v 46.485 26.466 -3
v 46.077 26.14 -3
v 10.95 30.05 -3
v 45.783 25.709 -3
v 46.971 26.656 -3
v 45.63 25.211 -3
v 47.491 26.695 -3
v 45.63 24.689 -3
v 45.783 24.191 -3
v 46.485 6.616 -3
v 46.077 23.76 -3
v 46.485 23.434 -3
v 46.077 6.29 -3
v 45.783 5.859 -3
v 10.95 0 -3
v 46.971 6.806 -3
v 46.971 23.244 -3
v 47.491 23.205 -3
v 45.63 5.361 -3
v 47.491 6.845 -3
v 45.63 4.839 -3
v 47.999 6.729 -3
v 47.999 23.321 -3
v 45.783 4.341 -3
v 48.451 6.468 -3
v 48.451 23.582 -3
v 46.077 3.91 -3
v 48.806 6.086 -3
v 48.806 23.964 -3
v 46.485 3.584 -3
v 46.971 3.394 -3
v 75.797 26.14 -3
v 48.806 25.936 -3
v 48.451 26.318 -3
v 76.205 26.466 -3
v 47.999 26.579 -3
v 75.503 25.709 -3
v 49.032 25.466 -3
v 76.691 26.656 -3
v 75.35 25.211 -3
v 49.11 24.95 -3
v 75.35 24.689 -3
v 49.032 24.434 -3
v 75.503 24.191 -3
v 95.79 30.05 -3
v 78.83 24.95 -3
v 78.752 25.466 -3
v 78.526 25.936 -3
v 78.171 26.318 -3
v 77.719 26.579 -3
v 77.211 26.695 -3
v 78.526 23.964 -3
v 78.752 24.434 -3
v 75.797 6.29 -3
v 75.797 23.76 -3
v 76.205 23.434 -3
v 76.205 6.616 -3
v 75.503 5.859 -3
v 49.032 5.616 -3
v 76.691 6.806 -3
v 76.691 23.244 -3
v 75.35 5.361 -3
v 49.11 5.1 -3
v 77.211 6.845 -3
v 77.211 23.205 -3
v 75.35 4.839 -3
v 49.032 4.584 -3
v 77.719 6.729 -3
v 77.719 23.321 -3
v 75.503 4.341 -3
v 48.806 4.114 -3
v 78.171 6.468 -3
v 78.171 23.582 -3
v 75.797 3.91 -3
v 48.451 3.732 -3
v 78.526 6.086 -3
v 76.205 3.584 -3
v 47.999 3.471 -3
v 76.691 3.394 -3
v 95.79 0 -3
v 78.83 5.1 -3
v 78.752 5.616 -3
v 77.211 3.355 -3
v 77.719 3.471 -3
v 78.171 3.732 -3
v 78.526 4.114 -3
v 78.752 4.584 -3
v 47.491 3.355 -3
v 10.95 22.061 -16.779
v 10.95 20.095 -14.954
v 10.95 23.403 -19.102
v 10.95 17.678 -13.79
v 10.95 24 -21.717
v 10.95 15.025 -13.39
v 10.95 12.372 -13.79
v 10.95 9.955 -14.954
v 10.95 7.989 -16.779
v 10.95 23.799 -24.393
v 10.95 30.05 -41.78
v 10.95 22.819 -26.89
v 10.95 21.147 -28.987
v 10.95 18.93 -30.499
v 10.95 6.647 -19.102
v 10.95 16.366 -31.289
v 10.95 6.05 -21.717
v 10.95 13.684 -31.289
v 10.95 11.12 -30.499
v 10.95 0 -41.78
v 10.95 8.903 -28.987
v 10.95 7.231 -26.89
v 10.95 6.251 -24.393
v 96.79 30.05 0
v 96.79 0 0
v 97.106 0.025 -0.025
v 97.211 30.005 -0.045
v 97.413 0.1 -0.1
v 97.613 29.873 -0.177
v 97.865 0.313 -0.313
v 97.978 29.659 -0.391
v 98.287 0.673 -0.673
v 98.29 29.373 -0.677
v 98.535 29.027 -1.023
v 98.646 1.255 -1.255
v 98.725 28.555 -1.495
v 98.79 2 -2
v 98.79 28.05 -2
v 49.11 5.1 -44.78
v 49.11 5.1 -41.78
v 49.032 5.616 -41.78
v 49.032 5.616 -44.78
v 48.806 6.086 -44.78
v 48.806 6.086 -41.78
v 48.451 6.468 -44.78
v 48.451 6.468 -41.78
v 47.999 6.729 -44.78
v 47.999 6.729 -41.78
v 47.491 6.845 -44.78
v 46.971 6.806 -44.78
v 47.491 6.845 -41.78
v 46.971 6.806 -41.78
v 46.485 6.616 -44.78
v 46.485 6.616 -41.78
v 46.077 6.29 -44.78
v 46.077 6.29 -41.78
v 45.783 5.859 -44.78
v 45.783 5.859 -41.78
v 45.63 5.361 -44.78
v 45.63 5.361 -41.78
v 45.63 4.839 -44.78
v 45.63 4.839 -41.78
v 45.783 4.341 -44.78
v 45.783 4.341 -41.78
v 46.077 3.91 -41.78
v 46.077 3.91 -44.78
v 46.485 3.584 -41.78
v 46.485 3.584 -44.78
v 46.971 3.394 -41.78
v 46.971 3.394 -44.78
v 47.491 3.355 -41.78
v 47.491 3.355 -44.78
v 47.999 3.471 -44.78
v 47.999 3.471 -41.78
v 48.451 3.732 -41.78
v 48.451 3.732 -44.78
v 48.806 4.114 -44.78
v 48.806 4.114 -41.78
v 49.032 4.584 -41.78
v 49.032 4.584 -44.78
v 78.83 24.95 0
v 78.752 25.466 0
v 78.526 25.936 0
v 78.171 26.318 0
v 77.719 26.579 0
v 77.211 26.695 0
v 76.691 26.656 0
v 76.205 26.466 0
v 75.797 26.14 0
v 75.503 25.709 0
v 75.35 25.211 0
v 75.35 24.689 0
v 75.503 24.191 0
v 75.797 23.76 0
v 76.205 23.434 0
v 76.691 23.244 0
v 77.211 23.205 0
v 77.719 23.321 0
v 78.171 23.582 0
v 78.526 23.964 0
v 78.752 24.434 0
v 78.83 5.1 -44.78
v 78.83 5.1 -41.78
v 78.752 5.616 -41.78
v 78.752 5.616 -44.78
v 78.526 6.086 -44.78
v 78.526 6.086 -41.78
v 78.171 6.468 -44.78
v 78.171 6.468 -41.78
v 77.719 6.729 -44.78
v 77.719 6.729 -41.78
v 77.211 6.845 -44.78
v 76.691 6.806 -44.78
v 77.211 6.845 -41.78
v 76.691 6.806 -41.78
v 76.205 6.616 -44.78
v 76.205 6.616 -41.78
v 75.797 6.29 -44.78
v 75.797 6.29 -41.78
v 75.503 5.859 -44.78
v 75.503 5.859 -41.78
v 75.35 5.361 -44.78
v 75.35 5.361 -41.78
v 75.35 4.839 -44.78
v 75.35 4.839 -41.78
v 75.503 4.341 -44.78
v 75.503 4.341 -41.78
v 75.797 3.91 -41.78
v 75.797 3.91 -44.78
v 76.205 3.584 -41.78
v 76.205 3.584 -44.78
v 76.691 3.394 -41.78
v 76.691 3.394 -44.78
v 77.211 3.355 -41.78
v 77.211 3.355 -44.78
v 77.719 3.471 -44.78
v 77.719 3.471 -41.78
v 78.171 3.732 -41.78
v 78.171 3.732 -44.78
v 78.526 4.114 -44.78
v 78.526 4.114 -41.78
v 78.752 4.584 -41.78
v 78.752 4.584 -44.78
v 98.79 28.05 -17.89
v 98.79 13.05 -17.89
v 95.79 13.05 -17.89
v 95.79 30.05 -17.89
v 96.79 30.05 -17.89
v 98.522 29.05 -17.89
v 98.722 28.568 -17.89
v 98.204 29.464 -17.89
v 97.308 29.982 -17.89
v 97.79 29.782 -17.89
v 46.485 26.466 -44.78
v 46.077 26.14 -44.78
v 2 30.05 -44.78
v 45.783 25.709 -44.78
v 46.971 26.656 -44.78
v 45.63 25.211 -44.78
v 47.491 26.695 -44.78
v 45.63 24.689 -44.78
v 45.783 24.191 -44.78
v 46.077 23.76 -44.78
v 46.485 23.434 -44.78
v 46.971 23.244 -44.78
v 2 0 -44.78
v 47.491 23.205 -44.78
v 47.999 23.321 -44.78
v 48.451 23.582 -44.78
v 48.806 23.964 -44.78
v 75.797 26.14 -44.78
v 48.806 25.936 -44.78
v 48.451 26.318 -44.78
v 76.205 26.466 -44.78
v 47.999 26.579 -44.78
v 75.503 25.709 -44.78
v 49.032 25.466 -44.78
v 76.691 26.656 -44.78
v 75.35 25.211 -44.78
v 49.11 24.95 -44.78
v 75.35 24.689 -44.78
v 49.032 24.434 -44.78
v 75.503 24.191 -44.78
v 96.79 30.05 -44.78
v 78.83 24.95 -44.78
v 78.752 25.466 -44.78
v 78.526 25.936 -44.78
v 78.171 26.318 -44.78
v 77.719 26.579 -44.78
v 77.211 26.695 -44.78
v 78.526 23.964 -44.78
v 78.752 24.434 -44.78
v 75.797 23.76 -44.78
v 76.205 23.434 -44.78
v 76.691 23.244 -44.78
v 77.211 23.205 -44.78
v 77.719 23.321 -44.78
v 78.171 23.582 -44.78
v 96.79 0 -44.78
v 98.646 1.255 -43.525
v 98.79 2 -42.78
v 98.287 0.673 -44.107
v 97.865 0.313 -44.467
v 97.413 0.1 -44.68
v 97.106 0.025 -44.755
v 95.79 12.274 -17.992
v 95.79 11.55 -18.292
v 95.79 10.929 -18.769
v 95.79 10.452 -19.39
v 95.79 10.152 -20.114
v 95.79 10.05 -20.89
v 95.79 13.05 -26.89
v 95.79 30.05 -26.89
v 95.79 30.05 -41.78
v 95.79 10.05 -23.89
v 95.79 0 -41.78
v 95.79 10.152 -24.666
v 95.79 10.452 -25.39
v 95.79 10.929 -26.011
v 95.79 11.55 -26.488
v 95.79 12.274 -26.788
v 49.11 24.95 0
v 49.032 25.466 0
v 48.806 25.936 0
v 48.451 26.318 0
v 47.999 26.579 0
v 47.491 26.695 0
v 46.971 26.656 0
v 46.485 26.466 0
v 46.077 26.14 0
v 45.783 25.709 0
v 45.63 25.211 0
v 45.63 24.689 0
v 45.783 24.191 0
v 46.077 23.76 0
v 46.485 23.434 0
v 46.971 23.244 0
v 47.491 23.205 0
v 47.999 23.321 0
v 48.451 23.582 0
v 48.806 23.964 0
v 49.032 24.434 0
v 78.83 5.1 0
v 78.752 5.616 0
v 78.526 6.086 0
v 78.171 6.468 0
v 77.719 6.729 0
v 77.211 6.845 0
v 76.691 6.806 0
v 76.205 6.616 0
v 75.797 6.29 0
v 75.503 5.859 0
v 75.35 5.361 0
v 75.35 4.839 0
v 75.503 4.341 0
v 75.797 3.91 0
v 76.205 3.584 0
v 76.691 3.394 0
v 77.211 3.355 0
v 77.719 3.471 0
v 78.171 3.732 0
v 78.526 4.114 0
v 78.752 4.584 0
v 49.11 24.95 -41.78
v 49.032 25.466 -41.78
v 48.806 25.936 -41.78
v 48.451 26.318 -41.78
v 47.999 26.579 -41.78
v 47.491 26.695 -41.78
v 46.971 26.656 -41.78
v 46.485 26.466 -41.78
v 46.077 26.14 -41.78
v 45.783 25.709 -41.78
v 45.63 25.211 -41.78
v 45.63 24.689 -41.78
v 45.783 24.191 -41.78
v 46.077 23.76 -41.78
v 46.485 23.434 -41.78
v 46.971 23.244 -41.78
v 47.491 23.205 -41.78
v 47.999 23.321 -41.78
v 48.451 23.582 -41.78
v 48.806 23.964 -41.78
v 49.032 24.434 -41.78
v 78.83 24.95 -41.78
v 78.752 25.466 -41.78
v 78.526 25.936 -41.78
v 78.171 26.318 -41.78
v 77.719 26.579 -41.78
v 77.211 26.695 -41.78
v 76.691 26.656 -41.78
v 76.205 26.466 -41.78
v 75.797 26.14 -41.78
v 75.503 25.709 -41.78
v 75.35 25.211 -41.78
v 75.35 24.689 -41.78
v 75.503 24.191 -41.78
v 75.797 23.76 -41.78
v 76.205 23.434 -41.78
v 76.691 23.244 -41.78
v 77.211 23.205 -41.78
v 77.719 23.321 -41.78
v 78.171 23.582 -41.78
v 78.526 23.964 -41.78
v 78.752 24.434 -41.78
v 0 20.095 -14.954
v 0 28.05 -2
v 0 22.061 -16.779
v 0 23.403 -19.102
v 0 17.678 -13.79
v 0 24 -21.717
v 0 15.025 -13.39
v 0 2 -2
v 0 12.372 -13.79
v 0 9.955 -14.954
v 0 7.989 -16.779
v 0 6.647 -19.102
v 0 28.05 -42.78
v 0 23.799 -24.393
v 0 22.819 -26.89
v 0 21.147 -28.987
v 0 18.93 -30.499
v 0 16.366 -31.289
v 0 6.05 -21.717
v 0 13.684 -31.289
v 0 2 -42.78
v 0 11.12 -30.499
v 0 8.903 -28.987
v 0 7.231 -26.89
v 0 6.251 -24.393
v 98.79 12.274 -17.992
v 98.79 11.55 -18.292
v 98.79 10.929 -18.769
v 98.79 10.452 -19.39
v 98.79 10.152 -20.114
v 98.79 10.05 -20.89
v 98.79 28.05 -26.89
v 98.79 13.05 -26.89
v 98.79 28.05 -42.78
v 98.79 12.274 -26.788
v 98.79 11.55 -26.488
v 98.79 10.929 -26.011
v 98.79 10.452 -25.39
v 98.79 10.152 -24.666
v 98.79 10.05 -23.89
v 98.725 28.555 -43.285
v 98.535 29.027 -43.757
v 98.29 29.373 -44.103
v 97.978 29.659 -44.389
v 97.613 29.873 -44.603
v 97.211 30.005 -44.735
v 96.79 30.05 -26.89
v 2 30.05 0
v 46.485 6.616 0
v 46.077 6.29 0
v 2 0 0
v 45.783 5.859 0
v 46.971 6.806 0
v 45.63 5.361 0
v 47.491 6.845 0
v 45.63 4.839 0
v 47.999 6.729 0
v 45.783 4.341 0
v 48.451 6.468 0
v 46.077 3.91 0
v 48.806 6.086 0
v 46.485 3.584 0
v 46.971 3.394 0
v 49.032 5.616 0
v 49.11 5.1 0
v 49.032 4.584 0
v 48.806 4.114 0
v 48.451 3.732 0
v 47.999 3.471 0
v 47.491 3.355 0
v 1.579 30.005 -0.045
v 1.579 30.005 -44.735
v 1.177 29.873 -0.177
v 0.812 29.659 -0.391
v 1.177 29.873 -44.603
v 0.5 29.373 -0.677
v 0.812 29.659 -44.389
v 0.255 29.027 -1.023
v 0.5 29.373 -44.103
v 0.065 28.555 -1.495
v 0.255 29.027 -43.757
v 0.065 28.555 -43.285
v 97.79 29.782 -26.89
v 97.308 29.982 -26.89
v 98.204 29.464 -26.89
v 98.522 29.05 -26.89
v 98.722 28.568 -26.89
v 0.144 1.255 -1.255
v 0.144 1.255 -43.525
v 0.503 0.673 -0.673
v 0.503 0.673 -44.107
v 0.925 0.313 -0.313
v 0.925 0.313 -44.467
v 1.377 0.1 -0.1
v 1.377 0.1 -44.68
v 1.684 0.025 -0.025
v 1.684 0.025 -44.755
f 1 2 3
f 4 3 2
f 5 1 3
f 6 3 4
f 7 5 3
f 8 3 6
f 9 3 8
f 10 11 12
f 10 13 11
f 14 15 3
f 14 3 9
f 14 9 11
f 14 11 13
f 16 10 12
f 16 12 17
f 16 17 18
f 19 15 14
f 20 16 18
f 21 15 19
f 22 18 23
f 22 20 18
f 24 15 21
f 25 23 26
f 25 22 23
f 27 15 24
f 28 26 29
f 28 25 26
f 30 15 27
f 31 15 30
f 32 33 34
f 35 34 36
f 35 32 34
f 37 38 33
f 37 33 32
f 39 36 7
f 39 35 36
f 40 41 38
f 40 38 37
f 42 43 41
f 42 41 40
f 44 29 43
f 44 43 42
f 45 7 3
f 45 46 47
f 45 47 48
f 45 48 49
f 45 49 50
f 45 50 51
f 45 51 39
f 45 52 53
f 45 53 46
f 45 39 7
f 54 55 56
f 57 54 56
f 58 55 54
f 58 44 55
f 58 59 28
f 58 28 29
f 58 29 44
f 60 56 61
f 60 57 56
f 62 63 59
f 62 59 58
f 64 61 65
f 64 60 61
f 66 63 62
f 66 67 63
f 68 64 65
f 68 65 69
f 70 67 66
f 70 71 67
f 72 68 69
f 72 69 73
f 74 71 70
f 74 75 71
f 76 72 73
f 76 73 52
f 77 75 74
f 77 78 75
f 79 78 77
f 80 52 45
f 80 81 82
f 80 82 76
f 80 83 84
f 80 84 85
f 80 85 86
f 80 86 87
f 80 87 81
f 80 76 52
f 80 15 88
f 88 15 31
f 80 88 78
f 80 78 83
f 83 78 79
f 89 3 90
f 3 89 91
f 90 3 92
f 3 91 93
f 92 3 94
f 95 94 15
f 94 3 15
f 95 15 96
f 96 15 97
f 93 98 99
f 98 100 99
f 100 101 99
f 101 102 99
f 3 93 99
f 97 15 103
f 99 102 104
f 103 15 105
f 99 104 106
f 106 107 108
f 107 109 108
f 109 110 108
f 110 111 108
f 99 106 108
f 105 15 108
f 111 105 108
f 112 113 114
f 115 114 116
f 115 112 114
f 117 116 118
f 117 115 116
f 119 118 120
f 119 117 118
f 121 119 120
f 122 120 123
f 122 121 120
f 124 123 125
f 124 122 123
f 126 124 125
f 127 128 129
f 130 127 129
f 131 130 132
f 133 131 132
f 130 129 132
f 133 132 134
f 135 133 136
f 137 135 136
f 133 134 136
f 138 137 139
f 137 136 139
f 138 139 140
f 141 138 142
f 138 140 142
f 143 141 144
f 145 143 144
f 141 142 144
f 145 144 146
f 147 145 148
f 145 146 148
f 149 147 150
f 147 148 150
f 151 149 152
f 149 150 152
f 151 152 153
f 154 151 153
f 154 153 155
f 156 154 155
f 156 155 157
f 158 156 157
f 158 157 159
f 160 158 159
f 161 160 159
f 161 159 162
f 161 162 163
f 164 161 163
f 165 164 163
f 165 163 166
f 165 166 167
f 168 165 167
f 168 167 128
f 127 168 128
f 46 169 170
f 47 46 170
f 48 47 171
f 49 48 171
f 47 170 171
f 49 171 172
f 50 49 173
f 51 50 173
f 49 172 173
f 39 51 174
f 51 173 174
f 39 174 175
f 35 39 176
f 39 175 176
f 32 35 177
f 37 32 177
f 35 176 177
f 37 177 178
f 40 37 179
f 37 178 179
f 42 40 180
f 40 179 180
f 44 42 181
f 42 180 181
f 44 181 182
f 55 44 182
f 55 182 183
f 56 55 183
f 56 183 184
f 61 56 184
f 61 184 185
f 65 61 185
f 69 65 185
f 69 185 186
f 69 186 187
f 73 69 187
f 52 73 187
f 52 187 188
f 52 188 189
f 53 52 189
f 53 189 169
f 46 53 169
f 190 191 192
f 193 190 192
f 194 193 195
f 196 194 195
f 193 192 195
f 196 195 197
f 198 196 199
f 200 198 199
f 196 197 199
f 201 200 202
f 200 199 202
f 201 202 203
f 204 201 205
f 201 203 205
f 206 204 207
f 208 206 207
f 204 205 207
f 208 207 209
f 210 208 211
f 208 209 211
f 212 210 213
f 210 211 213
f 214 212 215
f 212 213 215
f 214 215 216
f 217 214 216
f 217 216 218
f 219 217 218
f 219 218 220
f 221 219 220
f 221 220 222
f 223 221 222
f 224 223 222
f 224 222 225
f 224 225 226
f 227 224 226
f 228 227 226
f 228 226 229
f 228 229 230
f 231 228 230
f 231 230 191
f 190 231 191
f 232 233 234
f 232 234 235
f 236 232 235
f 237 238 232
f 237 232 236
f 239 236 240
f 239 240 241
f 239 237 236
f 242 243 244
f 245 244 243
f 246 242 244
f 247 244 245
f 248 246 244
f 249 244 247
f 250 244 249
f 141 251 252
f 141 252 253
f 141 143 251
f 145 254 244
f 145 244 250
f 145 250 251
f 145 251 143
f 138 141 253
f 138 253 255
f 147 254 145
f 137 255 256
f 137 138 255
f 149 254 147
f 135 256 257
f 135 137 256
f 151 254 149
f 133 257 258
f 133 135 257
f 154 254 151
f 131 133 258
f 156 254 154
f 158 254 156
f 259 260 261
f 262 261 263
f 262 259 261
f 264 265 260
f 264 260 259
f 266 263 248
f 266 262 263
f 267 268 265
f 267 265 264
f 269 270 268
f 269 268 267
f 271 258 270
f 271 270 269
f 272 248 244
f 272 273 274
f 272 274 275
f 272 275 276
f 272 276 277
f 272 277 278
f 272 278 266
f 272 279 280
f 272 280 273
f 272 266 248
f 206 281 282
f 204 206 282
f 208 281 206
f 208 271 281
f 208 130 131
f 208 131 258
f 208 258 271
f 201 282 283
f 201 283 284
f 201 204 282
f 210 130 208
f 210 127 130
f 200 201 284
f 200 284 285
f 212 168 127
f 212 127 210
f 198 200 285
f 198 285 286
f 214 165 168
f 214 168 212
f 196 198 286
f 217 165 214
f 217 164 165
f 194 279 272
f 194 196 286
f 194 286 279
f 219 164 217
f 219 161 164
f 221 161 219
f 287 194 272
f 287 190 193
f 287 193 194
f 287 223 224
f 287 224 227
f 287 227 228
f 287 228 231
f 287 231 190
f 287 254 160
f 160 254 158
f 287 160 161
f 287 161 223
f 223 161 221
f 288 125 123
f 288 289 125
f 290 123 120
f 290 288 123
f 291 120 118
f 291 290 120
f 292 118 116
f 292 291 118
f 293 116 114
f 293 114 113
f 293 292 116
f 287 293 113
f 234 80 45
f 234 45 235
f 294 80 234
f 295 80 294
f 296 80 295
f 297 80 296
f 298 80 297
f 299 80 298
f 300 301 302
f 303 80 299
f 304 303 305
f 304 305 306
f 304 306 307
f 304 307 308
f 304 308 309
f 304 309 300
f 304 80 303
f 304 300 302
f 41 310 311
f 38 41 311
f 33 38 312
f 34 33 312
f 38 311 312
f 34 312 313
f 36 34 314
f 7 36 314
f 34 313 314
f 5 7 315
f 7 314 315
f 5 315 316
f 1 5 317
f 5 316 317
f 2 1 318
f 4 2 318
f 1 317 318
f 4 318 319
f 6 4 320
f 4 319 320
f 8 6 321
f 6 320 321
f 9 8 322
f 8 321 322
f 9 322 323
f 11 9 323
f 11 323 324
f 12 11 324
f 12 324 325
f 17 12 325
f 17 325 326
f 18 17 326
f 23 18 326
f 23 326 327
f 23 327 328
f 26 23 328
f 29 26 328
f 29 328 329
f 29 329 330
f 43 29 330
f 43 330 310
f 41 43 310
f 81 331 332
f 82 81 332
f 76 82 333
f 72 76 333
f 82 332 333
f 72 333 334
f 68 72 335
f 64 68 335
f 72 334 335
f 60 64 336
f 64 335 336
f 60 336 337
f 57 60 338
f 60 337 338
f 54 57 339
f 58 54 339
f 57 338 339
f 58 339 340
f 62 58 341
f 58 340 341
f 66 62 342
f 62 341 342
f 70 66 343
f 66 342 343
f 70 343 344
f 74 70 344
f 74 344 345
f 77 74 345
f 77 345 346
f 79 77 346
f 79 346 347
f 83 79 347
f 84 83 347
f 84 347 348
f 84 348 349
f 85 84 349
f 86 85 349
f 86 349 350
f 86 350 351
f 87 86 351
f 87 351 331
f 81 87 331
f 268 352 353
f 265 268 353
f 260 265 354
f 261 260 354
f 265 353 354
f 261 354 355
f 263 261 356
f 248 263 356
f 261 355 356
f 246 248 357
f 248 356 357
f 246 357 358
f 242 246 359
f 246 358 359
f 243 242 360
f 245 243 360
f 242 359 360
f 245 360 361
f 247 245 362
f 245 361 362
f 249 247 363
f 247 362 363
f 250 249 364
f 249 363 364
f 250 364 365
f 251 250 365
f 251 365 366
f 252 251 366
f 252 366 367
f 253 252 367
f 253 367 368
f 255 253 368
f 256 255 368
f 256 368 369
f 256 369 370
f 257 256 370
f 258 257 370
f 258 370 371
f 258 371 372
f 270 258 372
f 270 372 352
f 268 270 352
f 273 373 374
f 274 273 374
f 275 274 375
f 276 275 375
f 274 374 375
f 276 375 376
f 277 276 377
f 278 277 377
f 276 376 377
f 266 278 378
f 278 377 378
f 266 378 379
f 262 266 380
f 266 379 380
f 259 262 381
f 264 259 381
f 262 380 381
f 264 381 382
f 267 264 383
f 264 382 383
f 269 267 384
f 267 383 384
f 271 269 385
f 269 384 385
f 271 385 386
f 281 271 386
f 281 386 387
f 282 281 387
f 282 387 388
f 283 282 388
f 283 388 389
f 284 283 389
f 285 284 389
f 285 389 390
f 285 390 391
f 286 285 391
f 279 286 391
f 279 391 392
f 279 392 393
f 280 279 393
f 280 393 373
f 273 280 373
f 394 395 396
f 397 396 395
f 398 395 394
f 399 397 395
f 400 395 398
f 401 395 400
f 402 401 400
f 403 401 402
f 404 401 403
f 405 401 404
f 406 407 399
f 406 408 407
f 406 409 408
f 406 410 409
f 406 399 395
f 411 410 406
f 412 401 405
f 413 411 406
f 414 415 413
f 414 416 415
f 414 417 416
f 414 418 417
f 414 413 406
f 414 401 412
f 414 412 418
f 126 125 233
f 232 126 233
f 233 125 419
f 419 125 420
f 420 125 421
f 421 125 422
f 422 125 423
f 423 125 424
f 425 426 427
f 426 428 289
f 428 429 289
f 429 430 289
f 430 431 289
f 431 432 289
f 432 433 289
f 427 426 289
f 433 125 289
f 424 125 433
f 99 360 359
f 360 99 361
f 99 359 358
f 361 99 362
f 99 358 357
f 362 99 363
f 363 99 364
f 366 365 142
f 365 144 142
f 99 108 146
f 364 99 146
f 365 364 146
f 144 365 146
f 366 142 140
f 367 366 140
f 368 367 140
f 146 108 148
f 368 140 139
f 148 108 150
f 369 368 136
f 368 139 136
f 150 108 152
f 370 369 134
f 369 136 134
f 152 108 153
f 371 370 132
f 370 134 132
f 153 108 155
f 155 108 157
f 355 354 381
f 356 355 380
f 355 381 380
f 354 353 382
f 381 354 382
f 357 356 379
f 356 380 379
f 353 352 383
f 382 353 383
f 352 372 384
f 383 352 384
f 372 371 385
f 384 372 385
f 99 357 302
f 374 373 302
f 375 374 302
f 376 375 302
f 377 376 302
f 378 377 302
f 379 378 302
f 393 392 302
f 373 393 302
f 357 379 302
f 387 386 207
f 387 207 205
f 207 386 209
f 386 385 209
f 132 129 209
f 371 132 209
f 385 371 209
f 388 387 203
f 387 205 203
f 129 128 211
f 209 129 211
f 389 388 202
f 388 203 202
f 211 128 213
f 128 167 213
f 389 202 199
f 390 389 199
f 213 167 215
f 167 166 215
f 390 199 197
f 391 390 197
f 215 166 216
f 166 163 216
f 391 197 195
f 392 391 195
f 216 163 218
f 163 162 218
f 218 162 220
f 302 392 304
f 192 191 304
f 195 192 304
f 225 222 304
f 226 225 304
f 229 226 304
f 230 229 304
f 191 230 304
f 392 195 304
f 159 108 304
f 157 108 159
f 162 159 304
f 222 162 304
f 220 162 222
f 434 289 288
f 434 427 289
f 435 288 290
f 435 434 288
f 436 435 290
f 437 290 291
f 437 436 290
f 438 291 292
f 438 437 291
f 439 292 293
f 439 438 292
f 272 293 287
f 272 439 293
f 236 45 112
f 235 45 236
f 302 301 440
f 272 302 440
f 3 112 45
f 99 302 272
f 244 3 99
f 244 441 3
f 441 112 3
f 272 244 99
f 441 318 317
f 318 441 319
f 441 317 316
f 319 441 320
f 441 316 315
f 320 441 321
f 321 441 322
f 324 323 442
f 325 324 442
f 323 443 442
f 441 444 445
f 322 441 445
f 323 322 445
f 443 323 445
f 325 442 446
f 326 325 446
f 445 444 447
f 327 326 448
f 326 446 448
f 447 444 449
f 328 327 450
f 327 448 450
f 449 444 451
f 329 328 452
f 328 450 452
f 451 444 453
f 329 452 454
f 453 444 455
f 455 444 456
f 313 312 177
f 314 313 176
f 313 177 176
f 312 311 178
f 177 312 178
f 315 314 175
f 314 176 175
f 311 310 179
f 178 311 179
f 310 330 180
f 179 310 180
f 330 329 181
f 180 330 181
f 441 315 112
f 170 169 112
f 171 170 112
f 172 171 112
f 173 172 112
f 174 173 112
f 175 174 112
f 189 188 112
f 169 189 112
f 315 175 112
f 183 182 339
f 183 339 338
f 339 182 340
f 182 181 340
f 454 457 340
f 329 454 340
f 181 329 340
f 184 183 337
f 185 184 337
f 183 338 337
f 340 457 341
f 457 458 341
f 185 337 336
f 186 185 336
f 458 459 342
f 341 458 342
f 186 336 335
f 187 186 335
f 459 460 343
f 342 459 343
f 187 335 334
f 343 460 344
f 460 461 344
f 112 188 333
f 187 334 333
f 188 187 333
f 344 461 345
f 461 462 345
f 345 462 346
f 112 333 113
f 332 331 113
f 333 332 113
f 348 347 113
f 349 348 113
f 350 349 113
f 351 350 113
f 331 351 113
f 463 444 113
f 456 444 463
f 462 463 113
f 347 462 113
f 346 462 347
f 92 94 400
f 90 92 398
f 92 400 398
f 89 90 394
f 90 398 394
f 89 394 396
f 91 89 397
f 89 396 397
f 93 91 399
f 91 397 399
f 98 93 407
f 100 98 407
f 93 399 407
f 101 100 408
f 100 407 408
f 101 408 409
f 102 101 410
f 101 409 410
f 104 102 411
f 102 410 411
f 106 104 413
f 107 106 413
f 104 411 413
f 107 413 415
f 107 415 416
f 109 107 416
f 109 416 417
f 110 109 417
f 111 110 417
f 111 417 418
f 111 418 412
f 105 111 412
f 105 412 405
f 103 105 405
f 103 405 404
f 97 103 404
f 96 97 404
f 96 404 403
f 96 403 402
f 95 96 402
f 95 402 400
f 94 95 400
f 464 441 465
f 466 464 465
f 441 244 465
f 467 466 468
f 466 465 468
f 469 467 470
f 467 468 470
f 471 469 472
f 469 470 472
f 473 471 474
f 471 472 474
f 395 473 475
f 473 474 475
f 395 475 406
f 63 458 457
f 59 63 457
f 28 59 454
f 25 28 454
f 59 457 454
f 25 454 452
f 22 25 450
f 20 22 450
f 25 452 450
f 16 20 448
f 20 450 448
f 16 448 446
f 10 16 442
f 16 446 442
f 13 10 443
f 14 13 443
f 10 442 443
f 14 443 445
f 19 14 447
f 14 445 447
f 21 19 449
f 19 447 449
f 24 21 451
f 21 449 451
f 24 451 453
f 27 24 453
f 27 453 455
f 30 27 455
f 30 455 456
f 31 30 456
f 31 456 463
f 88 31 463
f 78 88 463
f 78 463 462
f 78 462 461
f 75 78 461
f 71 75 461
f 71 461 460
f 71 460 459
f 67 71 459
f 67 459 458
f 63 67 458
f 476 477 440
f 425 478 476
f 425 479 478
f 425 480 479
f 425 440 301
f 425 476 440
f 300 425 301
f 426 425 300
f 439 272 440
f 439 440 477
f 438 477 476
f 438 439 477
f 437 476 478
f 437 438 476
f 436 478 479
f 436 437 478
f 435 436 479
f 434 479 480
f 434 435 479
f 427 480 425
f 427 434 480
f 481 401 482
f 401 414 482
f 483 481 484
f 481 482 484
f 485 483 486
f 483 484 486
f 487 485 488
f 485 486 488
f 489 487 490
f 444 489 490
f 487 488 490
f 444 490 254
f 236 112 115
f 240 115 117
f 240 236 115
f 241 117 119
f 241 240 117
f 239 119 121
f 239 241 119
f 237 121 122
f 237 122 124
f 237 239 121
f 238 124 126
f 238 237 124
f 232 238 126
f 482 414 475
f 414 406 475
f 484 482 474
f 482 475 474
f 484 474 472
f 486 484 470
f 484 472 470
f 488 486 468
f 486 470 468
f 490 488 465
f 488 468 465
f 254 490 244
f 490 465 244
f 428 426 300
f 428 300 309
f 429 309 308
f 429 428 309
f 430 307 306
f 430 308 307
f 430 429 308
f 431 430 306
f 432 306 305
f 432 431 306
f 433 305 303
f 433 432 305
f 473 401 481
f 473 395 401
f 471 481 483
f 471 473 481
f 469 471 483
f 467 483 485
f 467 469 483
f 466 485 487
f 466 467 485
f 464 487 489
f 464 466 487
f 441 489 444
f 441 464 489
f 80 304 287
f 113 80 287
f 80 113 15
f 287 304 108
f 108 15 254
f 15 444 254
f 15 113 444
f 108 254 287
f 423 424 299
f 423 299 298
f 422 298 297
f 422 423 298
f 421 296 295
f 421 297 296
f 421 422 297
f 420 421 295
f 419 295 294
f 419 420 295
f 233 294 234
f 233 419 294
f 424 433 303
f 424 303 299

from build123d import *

# Parameters (mm, degrees)
SKETCH1_W                 = 98.79
SKETCH1_H                 = 44.78
BOSS_EXTRUDE1_DEPTH       = 30.05
SHELL1_T                  = -3
SHELL1_THICKNESS_2_FACE_W = 38.78
SHELL1_THICKNESS_2_FACE_H = 30.05
SHELL1_THICKNESS_2_DEPTH  = 7.95
SKETCH2_R                 = 1.75
CUT_EXTRUDE1_DEPTH        = 113.550944021
FILLET1_R                 = 2
CUT_EXTRUDE3_DEPTH        = 29.61
SKETCH5_R                 = 9
CUT_EXTRUDE4_DEPTH        = 20


with BuildPart() as part:
    # Sketch1 → Boss-Extrude1 (new body)
    with BuildSketch(Plane(origin=(0, 0, 0), x_dir=(1, 0, 0), z_dir=(0, 1, 0))):
        with Locations((49.395, 22.39)):
            Rectangle(SKETCH1_W, SKETCH1_H)
    extrude(amount=BOSS_EXTRUDE1_DEPTH)

    # Shell1
    shell1_openings = [part.faces().sort_by_distance(p)[0] for p in [
        (49.395, 30.05, -22.39),
        (49.395, 0, -22.39),
    ]]
    offset(amount=SHELL1_T, openings=shell1_openings, kind=Kind.INTERSECTION)

    # Shell1 thickness 2 face (on inner face of the shell) → Shell1 thickness 2 (add)
    with BuildSketch(Plane(origin=(3, 15.025, -22.39), x_dir=(0, 0, -1), z_dir=(-1, 0, 0))):
        Rectangle(SHELL1_THICKNESS_2_FACE_W, SHELL1_THICKNESS_2_FACE_H)
    extrude(amount=-SHELL1_THICKNESS_2_DEPTH)

    # Sketch2 → Cut-Extrude1 (cut, through all)
    with BuildSketch(Plane.XY):
        with Locations((77.08, 24.95)):
            Circle(SKETCH2_R)
        with Locations((77.08, 5.1)):
            Circle(SKETCH2_R)
        with Locations((47.36, 5.1)):
            Circle(SKETCH2_R)
        with Locations((47.36, 24.95)):
            Circle(SKETCH2_R)
    extrude(amount=-CUT_EXTRUDE1_DEPTH, mode=Mode.SUBTRACT)

    # Fillet1
    fillet1_edges = [part.edges().sort_by_distance(p)[0] for p in [
        (98.79, 30.05, -22.39),
        (0, 30.05, -22.39),
        (98.79, 0, -22.39),
        (0, 0, -22.39),
        (0, 15.025, -44.78),
        (98.79, 15.025, -44.78),
        (98.79, 15.025, 0),
        (0, 15.025, 0),
    ]]
    fillet(fillet1_edges, radius=FILLET1_R)

    # Sketch4 → Cut-Extrude3 (cut)
    with BuildSketch(Plane(origin=(98.79, 0, 0), x_dir=(0, 0, -1), z_dir=(1, 0, 0))):
        with BuildLine():
            Line((17.89, 30.05), (26.89, 30.05))
            Line((26.89, 30.05), (26.89, 13.05))
            ThreePointArc((26.89, 13.05), (26.011320344, 10.928679656), (23.89, 10.05))
            Line((23.89, 10.05), (20.89, 10.05))
            ThreePointArc((20.89, 10.05), (18.768679656, 10.928679656), (17.89, 13.05))
            Line((17.89, 13.05), (17.89, 30.05))
        make_face()
    extrude(amount=-CUT_EXTRUDE3_DEPTH, mode=Mode.SUBTRACT)

    # Sketch5 → Cut-Extrude4 (cut)
    with BuildSketch(Plane.ZY):
        with Locations((-22.39, 15.025)):
            Circle(SKETCH5_R)
    extrude(amount=-CUT_EXTRUDE4_DEPTH, mode=Mode.SUBTRACT)


solid = part.part
